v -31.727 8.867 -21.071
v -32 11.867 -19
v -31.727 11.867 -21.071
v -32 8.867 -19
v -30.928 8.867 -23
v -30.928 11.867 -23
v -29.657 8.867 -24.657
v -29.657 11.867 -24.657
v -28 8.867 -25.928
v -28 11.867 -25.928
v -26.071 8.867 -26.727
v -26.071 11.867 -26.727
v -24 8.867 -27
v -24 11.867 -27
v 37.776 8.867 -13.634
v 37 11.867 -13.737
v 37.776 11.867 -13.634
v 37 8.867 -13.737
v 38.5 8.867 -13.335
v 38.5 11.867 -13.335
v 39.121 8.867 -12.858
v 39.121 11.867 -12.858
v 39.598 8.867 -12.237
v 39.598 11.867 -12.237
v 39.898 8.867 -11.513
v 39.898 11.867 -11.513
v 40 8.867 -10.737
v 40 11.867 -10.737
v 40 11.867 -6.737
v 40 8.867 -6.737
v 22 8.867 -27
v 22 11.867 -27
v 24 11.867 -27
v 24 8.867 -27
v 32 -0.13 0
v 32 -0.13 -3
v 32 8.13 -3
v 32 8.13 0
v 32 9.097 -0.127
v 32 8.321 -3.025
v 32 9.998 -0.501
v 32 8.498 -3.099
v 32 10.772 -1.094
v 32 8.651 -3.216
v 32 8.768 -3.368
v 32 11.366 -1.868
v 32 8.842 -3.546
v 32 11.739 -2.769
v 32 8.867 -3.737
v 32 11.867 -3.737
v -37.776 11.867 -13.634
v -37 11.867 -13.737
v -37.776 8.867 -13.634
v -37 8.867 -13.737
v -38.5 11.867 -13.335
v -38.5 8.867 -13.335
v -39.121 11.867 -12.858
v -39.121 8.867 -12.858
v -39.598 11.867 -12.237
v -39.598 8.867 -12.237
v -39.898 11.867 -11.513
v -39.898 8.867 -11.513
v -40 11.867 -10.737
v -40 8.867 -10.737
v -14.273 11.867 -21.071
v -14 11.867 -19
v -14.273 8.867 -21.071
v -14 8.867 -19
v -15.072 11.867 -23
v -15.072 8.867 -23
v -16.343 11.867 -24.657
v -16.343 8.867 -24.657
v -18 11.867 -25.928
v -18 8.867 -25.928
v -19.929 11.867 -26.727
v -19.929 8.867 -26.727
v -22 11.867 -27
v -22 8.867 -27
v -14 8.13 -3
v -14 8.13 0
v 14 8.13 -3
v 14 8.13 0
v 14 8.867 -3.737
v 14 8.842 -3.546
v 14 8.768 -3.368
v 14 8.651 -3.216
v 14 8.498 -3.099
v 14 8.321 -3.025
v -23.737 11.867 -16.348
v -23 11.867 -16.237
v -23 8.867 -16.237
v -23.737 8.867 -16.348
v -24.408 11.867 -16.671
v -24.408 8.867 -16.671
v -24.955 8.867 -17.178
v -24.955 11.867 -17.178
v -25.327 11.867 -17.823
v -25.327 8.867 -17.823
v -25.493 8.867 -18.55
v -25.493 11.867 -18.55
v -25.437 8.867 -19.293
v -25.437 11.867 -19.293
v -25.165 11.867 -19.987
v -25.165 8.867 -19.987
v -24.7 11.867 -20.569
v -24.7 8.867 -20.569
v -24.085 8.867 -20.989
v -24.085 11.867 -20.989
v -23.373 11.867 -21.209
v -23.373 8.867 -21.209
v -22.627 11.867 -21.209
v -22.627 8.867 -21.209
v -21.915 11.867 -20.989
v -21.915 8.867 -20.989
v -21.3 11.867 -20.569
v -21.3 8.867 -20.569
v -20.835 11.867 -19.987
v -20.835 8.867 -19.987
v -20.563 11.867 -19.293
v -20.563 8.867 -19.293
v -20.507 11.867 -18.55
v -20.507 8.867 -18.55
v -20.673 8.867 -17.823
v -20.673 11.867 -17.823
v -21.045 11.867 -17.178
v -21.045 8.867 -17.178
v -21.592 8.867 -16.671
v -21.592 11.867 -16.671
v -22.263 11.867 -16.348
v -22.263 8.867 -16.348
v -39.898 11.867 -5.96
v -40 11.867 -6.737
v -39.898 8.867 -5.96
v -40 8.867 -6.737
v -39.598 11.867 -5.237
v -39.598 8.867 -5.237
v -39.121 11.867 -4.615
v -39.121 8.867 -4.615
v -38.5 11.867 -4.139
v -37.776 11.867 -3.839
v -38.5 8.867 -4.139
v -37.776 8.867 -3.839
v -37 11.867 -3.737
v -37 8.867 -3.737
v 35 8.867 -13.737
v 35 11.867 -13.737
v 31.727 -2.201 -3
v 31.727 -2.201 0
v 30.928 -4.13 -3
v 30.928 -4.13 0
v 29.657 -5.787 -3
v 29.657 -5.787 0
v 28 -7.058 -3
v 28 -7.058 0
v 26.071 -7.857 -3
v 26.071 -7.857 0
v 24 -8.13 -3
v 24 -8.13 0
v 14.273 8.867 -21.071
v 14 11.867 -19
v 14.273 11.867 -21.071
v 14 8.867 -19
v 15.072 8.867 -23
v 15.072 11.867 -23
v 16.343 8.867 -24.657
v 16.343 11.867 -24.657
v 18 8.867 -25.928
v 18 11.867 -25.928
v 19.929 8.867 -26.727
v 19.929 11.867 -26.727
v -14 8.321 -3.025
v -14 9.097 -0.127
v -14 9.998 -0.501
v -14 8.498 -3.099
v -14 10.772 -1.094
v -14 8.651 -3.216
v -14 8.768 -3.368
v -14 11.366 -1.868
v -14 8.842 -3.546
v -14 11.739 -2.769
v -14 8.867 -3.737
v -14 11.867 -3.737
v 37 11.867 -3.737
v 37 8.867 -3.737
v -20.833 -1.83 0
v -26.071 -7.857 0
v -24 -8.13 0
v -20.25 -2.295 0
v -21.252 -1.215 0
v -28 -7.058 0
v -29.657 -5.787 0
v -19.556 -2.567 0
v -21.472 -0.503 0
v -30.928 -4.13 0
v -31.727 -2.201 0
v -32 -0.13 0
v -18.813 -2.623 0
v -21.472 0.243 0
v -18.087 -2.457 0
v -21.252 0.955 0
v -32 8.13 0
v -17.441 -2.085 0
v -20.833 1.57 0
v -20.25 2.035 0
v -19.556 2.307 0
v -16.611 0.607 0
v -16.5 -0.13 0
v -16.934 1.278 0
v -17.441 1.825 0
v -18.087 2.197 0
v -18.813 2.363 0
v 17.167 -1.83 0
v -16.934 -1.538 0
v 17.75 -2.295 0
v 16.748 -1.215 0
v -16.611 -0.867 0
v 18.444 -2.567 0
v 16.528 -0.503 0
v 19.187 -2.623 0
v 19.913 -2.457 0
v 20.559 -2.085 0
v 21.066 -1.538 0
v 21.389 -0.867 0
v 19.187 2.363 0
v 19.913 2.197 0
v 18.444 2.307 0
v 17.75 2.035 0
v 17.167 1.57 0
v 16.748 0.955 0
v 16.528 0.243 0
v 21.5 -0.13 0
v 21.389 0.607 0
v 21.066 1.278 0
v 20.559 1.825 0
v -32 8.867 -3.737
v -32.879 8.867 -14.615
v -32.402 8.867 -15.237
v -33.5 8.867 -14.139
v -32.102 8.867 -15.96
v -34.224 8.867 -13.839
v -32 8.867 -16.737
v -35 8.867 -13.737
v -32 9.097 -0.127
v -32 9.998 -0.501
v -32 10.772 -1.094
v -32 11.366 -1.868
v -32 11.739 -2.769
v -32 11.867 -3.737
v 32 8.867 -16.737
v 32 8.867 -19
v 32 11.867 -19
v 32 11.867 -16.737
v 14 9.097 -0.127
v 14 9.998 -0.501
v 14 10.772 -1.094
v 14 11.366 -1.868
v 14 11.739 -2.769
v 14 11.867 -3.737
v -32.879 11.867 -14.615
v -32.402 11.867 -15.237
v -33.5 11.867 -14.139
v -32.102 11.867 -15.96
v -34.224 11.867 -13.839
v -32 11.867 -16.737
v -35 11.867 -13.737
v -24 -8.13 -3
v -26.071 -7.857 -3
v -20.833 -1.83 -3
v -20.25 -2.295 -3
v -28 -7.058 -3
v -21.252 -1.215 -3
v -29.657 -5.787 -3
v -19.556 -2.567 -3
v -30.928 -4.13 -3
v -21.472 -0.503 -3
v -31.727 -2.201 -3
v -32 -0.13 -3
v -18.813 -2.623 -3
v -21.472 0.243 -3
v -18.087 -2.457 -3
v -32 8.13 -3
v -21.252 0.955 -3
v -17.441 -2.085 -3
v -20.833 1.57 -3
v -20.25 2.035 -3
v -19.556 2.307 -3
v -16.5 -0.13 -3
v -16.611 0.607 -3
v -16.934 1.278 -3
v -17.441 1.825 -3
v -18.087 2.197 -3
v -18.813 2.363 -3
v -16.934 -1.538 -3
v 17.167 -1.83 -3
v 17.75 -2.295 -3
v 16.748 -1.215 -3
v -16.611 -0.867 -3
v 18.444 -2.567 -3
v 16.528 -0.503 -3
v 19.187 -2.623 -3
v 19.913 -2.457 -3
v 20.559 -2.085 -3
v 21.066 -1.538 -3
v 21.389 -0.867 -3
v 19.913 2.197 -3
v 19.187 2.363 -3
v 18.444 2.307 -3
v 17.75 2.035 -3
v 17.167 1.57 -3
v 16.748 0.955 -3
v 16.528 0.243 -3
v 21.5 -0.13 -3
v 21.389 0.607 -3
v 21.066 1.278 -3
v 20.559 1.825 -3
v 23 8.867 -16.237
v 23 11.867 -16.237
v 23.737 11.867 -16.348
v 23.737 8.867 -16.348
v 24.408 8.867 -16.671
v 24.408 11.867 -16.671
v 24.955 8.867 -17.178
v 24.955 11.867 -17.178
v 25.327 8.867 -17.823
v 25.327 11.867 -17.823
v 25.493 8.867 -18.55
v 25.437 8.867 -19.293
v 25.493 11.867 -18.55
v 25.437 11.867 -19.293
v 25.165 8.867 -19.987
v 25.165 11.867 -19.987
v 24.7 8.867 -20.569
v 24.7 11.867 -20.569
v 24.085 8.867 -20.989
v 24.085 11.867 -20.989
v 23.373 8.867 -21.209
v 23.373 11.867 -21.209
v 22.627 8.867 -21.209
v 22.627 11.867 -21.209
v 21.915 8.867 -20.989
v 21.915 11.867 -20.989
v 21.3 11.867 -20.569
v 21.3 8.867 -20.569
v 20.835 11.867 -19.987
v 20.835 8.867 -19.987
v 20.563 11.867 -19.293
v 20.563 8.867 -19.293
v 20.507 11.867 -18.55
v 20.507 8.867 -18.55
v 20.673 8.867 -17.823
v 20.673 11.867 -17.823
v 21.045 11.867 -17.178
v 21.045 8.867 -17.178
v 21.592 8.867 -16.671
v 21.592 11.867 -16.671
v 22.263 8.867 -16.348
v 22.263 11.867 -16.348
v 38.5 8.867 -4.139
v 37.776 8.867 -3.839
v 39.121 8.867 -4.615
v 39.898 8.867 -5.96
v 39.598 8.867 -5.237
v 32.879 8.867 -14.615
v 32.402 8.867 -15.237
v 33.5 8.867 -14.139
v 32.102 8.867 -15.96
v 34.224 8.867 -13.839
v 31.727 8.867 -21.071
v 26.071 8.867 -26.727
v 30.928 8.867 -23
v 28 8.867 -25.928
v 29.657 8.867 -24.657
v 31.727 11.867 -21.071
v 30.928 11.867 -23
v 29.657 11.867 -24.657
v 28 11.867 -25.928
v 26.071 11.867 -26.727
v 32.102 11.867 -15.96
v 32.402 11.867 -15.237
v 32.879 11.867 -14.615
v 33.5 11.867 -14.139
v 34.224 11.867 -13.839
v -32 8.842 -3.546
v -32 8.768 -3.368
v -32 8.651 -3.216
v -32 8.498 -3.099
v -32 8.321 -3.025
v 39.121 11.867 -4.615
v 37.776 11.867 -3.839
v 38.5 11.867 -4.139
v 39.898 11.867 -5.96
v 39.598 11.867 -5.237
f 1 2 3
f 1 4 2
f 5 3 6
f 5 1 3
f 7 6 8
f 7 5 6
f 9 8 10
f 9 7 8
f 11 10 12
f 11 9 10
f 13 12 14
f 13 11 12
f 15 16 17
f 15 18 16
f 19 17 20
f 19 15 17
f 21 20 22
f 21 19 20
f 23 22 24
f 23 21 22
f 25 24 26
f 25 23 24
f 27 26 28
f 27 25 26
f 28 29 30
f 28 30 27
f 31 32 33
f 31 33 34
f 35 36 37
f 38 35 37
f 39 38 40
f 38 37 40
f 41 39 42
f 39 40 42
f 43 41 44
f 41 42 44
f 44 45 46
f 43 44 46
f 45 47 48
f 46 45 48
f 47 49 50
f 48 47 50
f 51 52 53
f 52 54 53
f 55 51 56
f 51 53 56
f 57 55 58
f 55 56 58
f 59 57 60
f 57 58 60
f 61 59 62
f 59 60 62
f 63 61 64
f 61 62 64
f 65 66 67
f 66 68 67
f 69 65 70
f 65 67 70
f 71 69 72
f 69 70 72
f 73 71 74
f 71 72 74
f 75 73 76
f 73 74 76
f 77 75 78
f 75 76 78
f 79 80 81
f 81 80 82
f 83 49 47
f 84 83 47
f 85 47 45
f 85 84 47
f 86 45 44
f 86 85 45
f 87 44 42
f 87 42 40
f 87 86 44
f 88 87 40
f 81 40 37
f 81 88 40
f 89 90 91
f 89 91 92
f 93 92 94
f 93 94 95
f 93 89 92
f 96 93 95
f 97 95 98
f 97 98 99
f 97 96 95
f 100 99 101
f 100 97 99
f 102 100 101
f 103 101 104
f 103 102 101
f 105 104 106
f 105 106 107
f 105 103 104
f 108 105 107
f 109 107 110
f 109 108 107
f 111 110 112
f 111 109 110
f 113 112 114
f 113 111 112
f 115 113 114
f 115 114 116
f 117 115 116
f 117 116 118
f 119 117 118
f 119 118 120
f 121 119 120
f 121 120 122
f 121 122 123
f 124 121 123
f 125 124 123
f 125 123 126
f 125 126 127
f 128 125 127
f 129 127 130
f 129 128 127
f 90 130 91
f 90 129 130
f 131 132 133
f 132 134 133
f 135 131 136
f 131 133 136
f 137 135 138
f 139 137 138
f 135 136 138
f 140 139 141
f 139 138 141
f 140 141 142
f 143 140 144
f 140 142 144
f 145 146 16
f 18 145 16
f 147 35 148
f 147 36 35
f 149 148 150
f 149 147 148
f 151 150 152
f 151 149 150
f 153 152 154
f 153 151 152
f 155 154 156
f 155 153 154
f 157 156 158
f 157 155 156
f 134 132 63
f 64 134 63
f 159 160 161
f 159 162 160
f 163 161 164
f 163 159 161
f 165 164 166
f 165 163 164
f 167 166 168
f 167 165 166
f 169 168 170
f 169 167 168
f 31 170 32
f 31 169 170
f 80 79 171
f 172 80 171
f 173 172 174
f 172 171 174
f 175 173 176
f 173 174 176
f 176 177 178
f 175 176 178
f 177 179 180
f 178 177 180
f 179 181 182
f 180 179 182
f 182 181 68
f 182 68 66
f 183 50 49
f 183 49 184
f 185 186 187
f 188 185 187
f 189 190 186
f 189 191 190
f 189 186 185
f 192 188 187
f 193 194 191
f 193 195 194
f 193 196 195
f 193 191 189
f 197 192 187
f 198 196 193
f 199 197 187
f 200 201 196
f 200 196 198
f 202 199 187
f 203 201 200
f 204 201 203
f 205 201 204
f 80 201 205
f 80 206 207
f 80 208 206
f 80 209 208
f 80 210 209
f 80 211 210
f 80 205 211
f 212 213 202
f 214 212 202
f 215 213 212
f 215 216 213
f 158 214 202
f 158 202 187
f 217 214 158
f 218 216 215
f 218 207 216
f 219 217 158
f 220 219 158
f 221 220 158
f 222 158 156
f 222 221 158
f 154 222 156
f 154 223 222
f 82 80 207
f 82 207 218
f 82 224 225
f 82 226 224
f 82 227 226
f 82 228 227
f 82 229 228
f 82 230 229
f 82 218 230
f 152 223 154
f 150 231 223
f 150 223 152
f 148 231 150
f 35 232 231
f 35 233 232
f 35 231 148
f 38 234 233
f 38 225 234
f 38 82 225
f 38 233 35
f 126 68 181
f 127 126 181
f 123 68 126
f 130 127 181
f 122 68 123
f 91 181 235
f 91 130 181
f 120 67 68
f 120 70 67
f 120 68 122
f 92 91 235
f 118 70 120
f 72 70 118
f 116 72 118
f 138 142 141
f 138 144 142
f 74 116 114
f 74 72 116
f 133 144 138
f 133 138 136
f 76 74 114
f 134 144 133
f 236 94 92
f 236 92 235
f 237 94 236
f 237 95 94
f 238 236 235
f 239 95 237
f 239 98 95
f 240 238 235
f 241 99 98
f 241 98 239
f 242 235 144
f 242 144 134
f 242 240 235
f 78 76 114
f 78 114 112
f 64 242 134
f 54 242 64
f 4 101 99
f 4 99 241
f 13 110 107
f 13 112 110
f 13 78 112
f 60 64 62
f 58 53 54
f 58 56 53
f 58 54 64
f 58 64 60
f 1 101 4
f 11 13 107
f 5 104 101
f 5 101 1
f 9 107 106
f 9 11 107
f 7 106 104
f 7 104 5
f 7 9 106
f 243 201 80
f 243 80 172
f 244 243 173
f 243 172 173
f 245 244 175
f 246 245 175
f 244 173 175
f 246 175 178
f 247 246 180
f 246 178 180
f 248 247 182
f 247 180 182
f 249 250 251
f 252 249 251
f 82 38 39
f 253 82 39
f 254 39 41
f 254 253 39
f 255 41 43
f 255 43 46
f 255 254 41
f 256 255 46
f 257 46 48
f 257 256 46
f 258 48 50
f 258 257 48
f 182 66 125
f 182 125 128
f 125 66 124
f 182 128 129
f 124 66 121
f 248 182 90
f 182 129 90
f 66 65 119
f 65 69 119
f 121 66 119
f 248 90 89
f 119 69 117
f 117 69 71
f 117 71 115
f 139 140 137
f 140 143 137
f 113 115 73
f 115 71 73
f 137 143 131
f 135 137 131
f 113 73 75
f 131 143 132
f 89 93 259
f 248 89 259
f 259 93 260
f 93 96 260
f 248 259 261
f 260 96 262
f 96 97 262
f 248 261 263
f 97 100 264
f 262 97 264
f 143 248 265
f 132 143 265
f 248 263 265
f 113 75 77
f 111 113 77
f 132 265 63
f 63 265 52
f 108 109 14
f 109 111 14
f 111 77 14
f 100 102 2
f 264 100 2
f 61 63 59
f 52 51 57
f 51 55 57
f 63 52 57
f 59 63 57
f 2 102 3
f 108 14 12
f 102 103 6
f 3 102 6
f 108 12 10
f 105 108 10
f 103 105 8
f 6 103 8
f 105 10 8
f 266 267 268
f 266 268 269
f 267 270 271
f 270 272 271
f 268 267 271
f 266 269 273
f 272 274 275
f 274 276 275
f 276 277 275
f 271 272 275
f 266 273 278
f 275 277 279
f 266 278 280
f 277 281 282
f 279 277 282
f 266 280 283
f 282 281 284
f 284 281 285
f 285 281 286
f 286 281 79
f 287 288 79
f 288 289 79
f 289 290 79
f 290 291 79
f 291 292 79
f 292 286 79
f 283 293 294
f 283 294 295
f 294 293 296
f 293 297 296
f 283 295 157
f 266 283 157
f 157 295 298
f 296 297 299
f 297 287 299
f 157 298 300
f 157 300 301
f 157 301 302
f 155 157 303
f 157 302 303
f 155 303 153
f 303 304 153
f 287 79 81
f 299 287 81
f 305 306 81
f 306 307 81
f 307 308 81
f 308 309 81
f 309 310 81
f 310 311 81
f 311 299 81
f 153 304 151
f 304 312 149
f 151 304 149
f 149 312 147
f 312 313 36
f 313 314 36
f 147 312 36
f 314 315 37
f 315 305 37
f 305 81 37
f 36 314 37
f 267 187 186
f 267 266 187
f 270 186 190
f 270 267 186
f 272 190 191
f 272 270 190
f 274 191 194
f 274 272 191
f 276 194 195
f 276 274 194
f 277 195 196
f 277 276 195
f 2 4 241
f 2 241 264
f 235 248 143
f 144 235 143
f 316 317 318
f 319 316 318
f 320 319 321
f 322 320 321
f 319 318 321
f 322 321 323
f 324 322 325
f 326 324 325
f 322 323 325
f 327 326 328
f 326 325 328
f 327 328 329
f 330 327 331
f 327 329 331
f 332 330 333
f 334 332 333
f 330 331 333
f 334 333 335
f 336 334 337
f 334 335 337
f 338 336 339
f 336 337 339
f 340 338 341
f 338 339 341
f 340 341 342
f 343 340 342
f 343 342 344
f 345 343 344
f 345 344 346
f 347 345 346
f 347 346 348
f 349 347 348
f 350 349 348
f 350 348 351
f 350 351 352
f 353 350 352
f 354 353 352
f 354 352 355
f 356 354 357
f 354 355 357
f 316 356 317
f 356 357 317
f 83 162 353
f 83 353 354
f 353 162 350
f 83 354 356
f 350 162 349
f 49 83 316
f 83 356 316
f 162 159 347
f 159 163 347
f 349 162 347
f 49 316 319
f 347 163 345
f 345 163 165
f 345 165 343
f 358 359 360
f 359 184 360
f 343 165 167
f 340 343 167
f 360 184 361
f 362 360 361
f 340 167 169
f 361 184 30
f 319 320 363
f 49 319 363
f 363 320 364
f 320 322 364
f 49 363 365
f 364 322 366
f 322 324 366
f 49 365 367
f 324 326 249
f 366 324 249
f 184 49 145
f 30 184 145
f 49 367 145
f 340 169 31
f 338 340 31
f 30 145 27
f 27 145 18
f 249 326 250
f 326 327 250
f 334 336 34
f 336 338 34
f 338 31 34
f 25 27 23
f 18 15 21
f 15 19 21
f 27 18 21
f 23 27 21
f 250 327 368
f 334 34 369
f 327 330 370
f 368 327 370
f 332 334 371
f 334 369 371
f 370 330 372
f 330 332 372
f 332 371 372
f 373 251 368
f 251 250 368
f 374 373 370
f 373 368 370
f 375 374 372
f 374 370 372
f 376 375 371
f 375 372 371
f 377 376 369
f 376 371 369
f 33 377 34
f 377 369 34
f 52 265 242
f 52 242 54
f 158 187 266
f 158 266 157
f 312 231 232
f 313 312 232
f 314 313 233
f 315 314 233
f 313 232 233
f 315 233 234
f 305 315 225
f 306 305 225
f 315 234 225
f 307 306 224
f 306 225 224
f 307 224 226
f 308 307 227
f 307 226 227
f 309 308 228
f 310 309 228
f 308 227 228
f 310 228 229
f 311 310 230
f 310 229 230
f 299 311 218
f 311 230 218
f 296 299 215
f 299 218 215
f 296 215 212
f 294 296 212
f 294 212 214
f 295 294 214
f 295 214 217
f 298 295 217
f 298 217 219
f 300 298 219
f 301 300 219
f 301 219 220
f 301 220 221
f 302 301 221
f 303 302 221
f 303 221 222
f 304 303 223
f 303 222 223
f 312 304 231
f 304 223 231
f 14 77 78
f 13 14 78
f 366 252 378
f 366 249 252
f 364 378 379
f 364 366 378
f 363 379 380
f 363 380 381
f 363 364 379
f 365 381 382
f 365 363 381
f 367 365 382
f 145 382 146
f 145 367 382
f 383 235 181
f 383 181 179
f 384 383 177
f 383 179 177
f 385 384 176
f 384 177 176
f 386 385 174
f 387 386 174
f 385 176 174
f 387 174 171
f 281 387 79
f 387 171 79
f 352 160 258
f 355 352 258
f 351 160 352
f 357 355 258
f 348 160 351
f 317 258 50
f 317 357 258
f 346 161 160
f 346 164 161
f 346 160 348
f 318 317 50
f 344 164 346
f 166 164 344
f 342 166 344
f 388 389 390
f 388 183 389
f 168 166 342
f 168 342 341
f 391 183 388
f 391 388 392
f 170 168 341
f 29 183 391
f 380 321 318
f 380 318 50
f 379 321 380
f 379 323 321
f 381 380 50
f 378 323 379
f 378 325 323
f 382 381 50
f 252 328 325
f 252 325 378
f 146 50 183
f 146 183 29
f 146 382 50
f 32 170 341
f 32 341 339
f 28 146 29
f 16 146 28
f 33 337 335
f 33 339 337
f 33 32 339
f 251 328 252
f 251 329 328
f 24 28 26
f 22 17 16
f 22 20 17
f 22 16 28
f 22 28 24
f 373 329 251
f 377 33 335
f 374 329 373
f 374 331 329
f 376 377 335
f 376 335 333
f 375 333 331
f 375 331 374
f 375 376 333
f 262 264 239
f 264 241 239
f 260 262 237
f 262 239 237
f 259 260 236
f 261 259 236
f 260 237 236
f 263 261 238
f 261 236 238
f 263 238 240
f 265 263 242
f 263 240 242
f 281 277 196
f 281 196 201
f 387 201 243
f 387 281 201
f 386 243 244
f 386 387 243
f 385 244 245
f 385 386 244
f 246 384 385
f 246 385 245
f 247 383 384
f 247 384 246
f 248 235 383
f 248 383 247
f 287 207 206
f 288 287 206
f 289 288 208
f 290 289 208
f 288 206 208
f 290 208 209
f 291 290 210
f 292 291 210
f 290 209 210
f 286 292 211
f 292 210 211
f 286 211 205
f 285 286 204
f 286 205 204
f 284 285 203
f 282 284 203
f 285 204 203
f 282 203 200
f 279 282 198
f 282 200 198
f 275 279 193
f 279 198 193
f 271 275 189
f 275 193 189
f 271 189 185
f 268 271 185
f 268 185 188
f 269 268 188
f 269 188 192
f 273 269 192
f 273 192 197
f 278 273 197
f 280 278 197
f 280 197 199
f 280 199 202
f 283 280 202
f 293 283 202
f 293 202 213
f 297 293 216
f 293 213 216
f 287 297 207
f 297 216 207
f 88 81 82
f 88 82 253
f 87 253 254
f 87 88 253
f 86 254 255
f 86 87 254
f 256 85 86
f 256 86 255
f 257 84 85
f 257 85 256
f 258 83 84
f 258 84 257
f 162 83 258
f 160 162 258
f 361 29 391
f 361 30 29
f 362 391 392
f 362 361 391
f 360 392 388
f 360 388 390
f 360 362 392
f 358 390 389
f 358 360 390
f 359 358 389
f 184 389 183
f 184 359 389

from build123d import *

# Parameters (mm, degrees)
SKETCH2_W            = 64
SKETCH2_H            = 16.26
BASE_FLANGE1_DEPTH   = 3
EDGE_FLANGE1_DEPTH   = 18
SKETCH10_R           = 2.5
CUT_EXTRUDE1_DEPTH   = 3
FILLET1_R            = 8
SKETCH14_R           = 2.5
SKETCH14_R_2         = 1
CUT_EXTRUDE5_DEPTH   = 3
SKETCH15_W           = 8
SKETCH15_H           = 10
TAB1_DEPTH           = 3
FILLET4_R            = 8
FILLET5_R            = 3
FILLET4_OF_MIRROR1_R = 8
FILLET5_OF_MIRROR1_R = 3


# Sheet-metal steps are written as plain solids
with BuildPart() as part:
    # Sketch2 → Base-Flange1 (new body)
    with BuildSketch(Plane.XY):
        Rectangle(SKETCH2_W, SKETCH2_H)
    extrude(amount=-BASE_FLANGE1_DEPTH)

    # Edge-Flange1 section (across the edge) → Edge-Flange1 (add)
    with BuildSketch(Plane(origin=(14, 8.8666, -3), x_dir=(0, -1, 0), z_dir=(1, 0, 0))):
        with BuildLine():
            Line((-3, 0.7366), (-3, 24))
            Line((-3, 24), (0, 24))
            Line((0, 24), (0, 0.7366))
            ThreePointArc((0, 0.7366), (0.215745145, 0.215745145), (0.7366, 0))
            Line((0.7366, 0), (0.7366, -3))
            ThreePointArc((0.7366, -3), (-1.905575199, -1.905575199), (-3, 0.7366))
        make_face()
    edge_flange1 = extrude(amount=EDGE_FLANGE1_DEPTH)

    # Sketch10 → Cut-Extrude1 (cut)
    with BuildSketch(Plane.XY):
        with Locations((-19, -0.13)):
            Circle(SKETCH10_R)
        with Locations((19, -0.13)):
            Circle(SKETCH10_R)
    extrude(amount=-CUT_EXTRUDE1_DEPTH, mode=Mode.SUBTRACT)

    # Fillet1
    fillet1_edges = [part.edges().sort_by_distance(p)[0] for p in [
        (32, -8.13, -1.5),
        (-32, -8.13, -1.5),
    ]]
    fillet(fillet1_edges, radius=FILLET1_R)

    # Sketch14 → Cut-Extrude5 (cut)
    with BuildSketch(Plane(origin=(0, 11.8666, 0), x_dir=(1, 0, 0), z_dir=(0, 1, 0))):
        with Locations(Location((23, 18.7366, 0), (0, 0, 270))):
            Circle(SKETCH14_R)
        with Locations((37, 22)):
            Circle(SKETCH14_R_2)
    cut_extrude5 = extrude(amount=-CUT_EXTRUDE5_DEPTH, mode=Mode.SUBTRACT)

    # Sketch15 → Tab1 (add)
    with BuildSketch(Plane(origin=(0, 11.8666, 0), x_dir=(1, 0, 0), z_dir=(0, 1, 0))):
        with Locations((36, 8.7366)):
            Rectangle(SKETCH15_W, SKETCH15_H)
    tab1 = extrude(amount=-TAB1_DEPTH)

    # Fillet4
    fillet4_edges = [part.edges().sort_by_distance(p)[0] for p in [
        (14, 10.3666, -27),
        (32, 10.3666, -27),
    ]]
    fillet(fillet4_edges, radius=FILLET4_R)

    # Fillet5
    fillet5_edges = [part.edges().sort_by_distance(p)[0] for p in [
        (32, 10.3666, -13.7366),
        (40, 10.3666, -13.7366),
        (40, 10.3666, -3.7366),
    ]]
    fillet(fillet5_edges, radius=FILLET5_R)

    # Mirror1: Edge-Flange1, Cut-Extrude5, Tab1 across plane
    add(edge_flange1.mirror(Plane(origin=(0, 0, 0), x_dir=(0, 0, 1), z_dir=(1, 0, 0))))
    add(cut_extrude5.mirror(Plane(origin=(0, 0, 0), x_dir=(0, 0, 1), z_dir=(1, 0, 0))), mode=Mode.SUBTRACT)
    add(tab1.mirror(Plane(origin=(0, 0, 0), x_dir=(0, 0, 1), z_dir=(1, 0, 0))))

    # Fillet4 of Mirror1
    fillet4_of_mirror1_edges = [part.edges().sort_by_distance(p)[0] for p in [
        (-14, 10.3666, -27),
        (-32, 10.3666, -27),
    ]]
    fillet(fillet4_of_mirror1_edges, radius=FILLET4_OF_MIRROR1_R)

    # Fillet5 of Mirror1
    fillet5_of_mirror1_edges = [part.edges().sort_by_distance(p)[0] for p in [
        (-32, 10.3666, -13.7366),
        (-40, 10.3666, -13.7366),
        (-40, 10.3666, -3.7366),
    ]]
    fillet(fillet5_of_mirror1_edges, radius=FILLET5_OF_MIRROR1_R)


solid = part.part
